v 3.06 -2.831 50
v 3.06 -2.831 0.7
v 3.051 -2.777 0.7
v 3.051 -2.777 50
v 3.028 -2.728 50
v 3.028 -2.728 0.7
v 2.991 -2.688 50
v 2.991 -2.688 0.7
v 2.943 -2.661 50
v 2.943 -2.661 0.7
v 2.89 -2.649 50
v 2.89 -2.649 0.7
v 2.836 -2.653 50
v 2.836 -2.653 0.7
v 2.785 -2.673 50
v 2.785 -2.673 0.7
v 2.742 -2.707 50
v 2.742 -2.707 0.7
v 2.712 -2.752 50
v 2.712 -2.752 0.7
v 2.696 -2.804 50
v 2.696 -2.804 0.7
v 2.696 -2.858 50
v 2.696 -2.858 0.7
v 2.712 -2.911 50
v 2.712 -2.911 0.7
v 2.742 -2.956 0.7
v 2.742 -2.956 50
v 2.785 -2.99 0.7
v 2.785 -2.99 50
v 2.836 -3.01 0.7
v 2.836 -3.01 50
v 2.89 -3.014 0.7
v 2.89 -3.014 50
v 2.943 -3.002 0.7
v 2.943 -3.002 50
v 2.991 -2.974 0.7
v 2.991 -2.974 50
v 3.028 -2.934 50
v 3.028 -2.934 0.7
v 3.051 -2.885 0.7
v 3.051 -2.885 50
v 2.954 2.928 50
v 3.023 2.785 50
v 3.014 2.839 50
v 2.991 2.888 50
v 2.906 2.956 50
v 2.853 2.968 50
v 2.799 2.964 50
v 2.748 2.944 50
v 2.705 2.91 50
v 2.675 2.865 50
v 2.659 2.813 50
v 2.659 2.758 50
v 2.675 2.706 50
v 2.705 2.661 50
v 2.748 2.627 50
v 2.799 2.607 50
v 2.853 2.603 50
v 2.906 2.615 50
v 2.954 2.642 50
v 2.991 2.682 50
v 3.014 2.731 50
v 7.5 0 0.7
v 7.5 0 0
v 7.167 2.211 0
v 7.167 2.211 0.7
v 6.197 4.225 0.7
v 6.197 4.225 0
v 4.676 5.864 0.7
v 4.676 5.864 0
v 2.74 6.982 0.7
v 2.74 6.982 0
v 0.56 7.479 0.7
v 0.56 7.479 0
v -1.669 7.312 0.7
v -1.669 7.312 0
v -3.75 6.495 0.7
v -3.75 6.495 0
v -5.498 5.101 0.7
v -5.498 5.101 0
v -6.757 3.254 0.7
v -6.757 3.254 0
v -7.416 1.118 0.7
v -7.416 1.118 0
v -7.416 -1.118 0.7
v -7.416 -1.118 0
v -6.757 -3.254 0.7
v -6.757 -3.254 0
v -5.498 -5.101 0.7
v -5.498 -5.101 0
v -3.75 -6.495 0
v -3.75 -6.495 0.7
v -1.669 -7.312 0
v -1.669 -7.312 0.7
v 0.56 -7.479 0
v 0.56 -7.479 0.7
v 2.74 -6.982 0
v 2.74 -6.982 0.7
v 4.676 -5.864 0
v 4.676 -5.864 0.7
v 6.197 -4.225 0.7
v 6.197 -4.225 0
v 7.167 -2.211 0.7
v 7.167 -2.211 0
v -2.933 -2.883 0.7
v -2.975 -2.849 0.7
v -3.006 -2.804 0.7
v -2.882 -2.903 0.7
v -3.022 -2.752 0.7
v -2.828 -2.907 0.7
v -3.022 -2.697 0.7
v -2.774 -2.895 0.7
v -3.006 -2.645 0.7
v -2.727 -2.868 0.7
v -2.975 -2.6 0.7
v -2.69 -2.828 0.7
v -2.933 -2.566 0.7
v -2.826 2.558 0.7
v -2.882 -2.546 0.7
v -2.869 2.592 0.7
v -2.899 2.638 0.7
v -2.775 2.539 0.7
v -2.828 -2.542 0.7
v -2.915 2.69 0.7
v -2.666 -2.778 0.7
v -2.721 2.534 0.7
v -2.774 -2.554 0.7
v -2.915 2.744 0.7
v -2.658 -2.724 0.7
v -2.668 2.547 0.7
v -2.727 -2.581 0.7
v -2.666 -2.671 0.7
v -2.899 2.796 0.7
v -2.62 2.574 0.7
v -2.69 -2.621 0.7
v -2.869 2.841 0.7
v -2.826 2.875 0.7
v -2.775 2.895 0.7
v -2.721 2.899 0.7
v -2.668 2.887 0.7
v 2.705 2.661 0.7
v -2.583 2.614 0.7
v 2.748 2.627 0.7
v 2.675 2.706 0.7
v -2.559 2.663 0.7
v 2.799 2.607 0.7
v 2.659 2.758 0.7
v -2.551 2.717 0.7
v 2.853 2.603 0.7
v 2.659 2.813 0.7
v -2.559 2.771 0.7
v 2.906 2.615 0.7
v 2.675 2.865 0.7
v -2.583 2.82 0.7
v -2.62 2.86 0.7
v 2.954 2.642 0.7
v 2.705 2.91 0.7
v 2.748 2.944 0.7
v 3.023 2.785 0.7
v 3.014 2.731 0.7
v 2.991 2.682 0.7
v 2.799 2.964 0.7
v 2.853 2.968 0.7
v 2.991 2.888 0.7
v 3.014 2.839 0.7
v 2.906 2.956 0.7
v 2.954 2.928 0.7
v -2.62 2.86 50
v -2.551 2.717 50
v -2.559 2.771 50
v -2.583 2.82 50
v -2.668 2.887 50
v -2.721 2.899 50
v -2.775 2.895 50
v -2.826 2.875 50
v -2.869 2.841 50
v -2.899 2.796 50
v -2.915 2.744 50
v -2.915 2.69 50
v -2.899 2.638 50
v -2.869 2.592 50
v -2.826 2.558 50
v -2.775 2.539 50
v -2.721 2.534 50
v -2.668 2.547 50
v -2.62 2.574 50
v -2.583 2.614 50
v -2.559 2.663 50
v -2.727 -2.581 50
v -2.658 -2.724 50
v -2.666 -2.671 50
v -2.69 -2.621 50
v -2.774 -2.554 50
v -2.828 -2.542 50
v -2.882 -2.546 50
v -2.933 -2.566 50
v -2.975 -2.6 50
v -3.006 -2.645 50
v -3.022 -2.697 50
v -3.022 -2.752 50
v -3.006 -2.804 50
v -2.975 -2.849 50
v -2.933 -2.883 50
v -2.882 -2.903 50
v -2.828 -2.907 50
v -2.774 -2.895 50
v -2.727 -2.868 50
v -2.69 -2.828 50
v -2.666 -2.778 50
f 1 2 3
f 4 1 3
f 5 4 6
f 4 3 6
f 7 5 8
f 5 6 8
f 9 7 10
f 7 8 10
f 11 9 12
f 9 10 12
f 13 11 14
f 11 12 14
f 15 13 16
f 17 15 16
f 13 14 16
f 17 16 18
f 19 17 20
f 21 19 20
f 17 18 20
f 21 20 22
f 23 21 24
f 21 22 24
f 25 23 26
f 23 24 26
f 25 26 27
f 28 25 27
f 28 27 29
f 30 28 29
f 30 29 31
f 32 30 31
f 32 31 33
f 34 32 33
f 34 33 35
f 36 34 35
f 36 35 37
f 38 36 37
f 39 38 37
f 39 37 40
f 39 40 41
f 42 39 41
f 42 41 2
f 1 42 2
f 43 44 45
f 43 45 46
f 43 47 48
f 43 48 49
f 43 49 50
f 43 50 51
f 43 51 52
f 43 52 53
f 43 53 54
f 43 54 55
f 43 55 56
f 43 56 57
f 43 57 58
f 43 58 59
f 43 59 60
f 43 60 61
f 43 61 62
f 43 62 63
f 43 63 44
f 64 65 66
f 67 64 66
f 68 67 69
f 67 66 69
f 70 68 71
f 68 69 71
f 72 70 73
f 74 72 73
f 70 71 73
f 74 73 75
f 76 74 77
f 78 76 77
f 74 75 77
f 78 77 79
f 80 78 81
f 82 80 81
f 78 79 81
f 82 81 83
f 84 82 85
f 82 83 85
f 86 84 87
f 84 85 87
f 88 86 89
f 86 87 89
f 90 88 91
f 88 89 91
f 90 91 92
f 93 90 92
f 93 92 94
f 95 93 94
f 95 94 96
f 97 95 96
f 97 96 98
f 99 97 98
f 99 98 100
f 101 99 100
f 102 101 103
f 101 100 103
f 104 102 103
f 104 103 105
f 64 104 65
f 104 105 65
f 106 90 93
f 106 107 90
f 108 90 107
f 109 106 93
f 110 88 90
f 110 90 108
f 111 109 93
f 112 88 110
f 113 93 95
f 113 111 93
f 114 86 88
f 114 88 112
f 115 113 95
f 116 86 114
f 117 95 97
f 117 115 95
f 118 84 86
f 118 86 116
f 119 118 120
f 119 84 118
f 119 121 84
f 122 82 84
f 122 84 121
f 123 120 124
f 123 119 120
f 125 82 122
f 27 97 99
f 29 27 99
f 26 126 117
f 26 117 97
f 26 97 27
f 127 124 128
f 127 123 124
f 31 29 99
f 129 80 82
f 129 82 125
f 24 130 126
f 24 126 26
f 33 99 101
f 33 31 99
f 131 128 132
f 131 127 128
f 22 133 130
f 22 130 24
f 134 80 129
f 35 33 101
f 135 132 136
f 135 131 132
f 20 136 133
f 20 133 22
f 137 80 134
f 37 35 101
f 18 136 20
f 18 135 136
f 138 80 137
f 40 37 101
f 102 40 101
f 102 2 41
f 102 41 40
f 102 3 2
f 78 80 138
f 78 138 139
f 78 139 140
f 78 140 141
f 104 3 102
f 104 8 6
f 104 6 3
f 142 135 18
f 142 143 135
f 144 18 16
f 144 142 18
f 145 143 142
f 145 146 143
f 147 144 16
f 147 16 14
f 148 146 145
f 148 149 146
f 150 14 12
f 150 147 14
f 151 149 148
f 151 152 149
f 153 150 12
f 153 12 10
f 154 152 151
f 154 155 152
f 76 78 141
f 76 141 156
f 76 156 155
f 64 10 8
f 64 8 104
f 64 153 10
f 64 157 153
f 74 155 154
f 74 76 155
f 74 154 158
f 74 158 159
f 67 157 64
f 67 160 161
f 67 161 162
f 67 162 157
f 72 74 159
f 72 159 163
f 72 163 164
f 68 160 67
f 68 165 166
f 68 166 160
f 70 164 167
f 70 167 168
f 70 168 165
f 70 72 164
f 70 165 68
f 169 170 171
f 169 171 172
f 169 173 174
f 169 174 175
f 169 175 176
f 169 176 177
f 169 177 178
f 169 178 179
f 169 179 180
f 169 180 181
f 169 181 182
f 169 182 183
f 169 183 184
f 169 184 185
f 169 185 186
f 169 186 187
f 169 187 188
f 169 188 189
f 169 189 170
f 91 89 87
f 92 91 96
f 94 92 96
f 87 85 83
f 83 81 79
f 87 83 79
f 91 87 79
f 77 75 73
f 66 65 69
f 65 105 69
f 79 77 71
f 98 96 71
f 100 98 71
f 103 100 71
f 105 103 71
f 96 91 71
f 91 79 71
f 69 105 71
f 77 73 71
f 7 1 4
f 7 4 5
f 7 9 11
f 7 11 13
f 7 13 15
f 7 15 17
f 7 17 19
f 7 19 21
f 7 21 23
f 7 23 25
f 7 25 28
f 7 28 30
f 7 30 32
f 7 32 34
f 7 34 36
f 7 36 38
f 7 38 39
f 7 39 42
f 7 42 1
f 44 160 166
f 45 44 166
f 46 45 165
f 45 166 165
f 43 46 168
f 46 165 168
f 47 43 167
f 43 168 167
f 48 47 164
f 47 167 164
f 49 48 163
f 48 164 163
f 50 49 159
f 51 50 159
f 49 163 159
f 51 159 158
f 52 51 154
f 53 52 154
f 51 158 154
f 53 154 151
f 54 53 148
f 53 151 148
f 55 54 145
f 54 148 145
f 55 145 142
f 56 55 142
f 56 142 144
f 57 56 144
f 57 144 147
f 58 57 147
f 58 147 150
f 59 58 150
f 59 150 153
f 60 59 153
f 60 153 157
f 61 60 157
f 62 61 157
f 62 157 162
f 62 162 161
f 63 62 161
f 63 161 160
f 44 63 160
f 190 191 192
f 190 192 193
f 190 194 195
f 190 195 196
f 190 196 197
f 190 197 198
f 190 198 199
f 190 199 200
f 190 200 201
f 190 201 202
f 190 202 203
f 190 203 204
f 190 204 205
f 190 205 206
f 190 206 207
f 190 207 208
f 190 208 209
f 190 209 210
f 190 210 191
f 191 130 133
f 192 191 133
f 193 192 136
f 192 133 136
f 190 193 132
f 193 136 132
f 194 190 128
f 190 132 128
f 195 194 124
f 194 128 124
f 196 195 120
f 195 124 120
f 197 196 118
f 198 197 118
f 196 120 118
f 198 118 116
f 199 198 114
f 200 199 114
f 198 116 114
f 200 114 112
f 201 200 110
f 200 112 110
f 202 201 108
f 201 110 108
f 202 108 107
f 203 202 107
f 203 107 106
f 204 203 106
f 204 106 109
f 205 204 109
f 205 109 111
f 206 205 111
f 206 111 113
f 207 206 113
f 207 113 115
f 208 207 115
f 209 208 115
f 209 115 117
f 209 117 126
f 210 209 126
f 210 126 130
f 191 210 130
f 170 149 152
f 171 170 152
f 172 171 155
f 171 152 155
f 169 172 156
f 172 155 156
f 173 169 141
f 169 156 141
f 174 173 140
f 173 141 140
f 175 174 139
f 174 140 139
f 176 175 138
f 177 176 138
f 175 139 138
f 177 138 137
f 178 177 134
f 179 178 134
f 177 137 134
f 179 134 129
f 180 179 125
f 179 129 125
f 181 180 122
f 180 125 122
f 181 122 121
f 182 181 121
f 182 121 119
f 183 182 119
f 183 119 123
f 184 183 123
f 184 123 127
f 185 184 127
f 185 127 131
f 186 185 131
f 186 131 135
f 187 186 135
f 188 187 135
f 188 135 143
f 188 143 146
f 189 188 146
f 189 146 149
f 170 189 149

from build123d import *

# Parameters (mm, degrees)
F0_R     = 7.5
F1_DEPTH = 0.7
F2_R     = 0.183
F3_DEPTH = 50


with BuildPart() as f1:
    # F0 (on Top) → F1 (new body)
    with BuildSketch(Plane.XY):
        Circle(F0_R)
    extrude(amount=F1_DEPTH)

    # F2 (on Top) → F3 (join)
    with BuildSketch(Plane.XY):
        with Locations((-2.734368, 2.716938)):
            Circle(F2_R)
        with Locations((2.83951, 2.785288)):
            Circle(F2_R)
        with Locations((2.876553, -2.831199)):
            Circle(F2_R)
        with Locations((-2.841227, -2.724453)):
            Circle(F2_R)
    extrude(amount=F3_DEPTH)


solid = f1.part
